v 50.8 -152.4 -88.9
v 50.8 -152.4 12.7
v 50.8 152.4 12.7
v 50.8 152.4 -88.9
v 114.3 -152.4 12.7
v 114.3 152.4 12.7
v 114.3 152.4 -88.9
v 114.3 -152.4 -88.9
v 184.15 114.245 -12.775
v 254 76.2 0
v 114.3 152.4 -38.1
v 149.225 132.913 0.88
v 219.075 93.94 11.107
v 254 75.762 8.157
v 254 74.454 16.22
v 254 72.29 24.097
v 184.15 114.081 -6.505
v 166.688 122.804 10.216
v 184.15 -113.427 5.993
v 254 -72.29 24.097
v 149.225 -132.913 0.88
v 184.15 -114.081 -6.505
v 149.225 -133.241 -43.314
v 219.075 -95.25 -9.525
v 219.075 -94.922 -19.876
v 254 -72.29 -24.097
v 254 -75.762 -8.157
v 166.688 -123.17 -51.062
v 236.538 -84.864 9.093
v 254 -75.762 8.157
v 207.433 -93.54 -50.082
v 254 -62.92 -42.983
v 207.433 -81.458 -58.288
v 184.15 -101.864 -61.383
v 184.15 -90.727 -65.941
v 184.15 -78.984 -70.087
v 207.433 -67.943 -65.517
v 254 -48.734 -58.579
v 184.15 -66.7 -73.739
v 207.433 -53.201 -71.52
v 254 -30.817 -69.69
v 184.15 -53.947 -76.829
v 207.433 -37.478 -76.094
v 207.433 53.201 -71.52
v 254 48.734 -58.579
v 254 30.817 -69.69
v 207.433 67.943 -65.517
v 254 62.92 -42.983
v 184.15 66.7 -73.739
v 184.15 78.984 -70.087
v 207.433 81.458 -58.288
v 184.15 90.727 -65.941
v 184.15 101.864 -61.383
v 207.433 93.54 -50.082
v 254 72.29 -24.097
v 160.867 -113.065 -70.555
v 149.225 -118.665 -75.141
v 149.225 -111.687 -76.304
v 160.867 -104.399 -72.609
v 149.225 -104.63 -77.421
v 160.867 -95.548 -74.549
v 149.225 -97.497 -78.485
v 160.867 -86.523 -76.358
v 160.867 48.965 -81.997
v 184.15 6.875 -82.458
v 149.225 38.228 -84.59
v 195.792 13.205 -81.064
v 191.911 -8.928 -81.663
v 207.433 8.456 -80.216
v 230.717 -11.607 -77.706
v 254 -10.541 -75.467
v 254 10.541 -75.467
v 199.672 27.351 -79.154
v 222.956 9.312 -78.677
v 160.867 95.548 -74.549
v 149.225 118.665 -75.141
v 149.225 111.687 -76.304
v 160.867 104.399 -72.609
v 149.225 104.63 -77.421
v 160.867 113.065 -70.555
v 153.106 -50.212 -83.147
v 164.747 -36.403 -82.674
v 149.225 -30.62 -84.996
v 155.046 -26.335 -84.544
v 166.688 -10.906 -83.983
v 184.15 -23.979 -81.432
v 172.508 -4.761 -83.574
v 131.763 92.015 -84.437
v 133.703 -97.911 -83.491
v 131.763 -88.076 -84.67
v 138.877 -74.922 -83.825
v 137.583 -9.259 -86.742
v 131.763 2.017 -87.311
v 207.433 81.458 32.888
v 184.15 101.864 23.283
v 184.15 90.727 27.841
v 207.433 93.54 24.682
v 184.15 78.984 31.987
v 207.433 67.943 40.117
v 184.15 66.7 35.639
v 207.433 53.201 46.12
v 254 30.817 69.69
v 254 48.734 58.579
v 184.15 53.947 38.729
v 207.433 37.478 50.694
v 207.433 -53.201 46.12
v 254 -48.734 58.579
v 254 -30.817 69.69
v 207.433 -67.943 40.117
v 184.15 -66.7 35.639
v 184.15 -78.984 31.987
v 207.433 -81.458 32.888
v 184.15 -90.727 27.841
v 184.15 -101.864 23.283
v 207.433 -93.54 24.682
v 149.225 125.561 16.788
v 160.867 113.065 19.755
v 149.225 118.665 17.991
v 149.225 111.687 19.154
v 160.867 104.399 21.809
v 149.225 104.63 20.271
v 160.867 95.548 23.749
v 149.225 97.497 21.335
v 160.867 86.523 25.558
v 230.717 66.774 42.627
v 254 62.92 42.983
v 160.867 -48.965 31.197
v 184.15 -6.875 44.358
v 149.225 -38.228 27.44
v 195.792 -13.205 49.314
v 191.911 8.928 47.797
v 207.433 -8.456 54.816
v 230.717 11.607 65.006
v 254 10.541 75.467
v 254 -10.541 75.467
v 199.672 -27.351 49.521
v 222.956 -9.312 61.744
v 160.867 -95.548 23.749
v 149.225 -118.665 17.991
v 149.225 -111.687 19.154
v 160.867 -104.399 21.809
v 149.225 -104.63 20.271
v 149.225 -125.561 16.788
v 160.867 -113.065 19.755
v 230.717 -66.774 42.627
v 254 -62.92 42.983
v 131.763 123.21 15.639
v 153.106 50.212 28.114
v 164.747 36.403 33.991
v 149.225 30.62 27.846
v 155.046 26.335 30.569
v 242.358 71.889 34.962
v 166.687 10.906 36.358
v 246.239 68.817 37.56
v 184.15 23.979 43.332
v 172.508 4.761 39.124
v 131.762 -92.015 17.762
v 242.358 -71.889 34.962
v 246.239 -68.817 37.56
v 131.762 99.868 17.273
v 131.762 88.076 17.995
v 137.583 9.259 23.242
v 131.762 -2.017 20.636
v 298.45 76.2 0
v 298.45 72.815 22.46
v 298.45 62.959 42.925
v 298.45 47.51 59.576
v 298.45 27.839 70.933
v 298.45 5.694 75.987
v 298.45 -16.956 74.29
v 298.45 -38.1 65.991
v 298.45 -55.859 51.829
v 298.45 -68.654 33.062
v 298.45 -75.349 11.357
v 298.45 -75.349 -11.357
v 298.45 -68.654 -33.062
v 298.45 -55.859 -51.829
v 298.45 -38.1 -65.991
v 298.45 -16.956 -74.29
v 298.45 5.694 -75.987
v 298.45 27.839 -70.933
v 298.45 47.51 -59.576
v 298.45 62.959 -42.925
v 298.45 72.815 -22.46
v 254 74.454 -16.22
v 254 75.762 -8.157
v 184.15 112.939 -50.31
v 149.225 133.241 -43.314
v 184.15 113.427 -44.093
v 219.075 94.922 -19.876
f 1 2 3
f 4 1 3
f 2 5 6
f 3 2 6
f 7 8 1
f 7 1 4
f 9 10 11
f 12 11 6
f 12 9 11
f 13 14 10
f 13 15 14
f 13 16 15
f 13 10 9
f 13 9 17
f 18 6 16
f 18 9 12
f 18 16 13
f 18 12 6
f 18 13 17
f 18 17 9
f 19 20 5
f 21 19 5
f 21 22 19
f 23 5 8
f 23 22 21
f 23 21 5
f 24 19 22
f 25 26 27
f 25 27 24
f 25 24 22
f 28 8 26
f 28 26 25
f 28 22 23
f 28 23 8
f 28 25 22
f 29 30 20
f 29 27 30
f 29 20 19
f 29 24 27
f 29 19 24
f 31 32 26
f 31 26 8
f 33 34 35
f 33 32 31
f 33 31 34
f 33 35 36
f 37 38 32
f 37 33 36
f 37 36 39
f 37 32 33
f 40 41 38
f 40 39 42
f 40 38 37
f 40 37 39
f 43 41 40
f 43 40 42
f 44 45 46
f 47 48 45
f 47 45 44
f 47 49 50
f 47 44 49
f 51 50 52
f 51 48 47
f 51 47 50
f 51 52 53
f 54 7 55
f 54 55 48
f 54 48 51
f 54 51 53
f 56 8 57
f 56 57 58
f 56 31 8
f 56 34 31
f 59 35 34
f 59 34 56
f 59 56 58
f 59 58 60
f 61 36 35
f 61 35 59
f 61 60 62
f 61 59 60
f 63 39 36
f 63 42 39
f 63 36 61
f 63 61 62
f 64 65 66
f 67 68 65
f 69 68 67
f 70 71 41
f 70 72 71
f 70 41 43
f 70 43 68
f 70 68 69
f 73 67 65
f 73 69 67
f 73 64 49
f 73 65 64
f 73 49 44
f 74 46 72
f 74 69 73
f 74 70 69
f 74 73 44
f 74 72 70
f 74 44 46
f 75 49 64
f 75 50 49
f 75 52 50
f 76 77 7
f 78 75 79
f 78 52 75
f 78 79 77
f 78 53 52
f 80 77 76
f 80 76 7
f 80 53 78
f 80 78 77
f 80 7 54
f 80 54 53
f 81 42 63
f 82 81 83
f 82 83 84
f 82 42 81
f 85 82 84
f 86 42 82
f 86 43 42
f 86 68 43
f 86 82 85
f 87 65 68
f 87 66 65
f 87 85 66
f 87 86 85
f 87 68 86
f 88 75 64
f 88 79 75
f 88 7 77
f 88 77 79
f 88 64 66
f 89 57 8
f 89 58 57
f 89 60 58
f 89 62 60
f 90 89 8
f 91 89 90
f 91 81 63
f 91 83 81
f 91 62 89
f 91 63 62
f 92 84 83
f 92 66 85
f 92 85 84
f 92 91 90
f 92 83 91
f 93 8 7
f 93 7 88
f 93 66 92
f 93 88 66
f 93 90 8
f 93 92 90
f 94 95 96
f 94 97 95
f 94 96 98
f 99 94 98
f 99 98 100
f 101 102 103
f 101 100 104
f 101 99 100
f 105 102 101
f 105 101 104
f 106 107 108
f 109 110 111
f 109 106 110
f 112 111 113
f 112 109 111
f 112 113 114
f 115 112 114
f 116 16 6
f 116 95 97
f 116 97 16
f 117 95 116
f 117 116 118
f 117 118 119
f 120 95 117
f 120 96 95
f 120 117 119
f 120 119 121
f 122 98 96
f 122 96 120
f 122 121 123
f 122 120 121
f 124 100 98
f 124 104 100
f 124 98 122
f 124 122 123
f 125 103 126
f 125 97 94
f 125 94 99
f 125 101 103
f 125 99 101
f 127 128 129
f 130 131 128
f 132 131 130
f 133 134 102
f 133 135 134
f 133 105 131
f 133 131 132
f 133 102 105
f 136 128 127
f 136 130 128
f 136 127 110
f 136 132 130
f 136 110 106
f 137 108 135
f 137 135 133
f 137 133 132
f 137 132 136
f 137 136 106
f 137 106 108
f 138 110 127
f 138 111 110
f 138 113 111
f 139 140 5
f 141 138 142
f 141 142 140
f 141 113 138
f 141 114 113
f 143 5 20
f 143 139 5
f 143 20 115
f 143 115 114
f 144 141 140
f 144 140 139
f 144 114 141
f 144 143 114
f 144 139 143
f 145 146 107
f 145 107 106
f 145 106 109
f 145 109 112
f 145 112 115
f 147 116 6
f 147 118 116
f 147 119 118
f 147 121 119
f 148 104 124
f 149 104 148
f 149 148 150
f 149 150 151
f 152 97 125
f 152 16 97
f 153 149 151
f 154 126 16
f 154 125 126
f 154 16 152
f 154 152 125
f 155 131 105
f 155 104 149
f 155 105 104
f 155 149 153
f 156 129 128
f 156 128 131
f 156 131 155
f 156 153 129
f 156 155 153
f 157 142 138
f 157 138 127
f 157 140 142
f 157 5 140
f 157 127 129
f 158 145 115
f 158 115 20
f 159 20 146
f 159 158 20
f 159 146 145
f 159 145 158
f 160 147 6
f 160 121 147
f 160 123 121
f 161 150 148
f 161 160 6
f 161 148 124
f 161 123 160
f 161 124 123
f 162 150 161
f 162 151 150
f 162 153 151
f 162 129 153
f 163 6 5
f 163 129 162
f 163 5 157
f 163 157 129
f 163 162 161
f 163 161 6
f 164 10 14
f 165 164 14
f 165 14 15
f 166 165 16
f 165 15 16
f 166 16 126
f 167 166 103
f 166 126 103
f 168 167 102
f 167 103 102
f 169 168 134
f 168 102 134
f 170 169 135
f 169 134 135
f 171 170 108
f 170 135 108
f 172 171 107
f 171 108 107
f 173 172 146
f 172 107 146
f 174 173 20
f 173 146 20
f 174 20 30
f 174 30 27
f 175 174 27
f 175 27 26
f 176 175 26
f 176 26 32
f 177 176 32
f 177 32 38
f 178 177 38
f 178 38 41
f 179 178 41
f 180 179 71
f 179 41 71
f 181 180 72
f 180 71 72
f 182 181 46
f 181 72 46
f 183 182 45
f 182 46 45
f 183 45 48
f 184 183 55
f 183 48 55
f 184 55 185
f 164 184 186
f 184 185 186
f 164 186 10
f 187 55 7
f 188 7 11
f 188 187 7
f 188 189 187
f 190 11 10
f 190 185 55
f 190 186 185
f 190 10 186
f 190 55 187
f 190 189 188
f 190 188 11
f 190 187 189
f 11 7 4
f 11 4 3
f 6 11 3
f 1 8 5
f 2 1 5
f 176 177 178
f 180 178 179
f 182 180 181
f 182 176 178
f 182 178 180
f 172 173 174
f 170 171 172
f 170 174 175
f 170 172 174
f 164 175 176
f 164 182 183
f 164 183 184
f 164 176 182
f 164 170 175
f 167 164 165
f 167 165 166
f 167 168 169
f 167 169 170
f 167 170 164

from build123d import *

# Parameters (mm, degrees)
SKETCH003_R  = 76.2
PAD001_DEPTH = 44.45
SKETCH_W     = 304.8
SKETCH_H     = 101.6
SKETCH001_R  = 76.2
SKETCH004_W  = 304.8
SKETCH004_H  = 101.6
PAD_DEPTH    = 63.5


with BuildPart() as part:
    # Sketch003 → Pad001 (new body)
    with BuildSketch(Plane.YZ.offset(254)):
        Circle(SKETCH003_R)
    extrude(amount=PAD001_DEPTH)

    # Sketch → AdditiveLoft section 0
    with BuildSketch(Plane.YZ.offset(114.3)):
        with Locations((0, -38.1)):
            Rectangle(SKETCH_W, SKETCH_H)
    # Sketch001 → AdditiveLoft section 1
    with BuildSketch(Plane.YZ.offset(254)):
        Circle(SKETCH001_R)
    loft()

    # Sketch004 → Pad (join)
    with BuildSketch(Plane.YZ.offset(114.3)):
        with Locations((0, -38.1)):
            Rectangle(SKETCH004_W, SKETCH004_H)
    extrude(amount=-PAD_DEPTH)


solid = part.part
